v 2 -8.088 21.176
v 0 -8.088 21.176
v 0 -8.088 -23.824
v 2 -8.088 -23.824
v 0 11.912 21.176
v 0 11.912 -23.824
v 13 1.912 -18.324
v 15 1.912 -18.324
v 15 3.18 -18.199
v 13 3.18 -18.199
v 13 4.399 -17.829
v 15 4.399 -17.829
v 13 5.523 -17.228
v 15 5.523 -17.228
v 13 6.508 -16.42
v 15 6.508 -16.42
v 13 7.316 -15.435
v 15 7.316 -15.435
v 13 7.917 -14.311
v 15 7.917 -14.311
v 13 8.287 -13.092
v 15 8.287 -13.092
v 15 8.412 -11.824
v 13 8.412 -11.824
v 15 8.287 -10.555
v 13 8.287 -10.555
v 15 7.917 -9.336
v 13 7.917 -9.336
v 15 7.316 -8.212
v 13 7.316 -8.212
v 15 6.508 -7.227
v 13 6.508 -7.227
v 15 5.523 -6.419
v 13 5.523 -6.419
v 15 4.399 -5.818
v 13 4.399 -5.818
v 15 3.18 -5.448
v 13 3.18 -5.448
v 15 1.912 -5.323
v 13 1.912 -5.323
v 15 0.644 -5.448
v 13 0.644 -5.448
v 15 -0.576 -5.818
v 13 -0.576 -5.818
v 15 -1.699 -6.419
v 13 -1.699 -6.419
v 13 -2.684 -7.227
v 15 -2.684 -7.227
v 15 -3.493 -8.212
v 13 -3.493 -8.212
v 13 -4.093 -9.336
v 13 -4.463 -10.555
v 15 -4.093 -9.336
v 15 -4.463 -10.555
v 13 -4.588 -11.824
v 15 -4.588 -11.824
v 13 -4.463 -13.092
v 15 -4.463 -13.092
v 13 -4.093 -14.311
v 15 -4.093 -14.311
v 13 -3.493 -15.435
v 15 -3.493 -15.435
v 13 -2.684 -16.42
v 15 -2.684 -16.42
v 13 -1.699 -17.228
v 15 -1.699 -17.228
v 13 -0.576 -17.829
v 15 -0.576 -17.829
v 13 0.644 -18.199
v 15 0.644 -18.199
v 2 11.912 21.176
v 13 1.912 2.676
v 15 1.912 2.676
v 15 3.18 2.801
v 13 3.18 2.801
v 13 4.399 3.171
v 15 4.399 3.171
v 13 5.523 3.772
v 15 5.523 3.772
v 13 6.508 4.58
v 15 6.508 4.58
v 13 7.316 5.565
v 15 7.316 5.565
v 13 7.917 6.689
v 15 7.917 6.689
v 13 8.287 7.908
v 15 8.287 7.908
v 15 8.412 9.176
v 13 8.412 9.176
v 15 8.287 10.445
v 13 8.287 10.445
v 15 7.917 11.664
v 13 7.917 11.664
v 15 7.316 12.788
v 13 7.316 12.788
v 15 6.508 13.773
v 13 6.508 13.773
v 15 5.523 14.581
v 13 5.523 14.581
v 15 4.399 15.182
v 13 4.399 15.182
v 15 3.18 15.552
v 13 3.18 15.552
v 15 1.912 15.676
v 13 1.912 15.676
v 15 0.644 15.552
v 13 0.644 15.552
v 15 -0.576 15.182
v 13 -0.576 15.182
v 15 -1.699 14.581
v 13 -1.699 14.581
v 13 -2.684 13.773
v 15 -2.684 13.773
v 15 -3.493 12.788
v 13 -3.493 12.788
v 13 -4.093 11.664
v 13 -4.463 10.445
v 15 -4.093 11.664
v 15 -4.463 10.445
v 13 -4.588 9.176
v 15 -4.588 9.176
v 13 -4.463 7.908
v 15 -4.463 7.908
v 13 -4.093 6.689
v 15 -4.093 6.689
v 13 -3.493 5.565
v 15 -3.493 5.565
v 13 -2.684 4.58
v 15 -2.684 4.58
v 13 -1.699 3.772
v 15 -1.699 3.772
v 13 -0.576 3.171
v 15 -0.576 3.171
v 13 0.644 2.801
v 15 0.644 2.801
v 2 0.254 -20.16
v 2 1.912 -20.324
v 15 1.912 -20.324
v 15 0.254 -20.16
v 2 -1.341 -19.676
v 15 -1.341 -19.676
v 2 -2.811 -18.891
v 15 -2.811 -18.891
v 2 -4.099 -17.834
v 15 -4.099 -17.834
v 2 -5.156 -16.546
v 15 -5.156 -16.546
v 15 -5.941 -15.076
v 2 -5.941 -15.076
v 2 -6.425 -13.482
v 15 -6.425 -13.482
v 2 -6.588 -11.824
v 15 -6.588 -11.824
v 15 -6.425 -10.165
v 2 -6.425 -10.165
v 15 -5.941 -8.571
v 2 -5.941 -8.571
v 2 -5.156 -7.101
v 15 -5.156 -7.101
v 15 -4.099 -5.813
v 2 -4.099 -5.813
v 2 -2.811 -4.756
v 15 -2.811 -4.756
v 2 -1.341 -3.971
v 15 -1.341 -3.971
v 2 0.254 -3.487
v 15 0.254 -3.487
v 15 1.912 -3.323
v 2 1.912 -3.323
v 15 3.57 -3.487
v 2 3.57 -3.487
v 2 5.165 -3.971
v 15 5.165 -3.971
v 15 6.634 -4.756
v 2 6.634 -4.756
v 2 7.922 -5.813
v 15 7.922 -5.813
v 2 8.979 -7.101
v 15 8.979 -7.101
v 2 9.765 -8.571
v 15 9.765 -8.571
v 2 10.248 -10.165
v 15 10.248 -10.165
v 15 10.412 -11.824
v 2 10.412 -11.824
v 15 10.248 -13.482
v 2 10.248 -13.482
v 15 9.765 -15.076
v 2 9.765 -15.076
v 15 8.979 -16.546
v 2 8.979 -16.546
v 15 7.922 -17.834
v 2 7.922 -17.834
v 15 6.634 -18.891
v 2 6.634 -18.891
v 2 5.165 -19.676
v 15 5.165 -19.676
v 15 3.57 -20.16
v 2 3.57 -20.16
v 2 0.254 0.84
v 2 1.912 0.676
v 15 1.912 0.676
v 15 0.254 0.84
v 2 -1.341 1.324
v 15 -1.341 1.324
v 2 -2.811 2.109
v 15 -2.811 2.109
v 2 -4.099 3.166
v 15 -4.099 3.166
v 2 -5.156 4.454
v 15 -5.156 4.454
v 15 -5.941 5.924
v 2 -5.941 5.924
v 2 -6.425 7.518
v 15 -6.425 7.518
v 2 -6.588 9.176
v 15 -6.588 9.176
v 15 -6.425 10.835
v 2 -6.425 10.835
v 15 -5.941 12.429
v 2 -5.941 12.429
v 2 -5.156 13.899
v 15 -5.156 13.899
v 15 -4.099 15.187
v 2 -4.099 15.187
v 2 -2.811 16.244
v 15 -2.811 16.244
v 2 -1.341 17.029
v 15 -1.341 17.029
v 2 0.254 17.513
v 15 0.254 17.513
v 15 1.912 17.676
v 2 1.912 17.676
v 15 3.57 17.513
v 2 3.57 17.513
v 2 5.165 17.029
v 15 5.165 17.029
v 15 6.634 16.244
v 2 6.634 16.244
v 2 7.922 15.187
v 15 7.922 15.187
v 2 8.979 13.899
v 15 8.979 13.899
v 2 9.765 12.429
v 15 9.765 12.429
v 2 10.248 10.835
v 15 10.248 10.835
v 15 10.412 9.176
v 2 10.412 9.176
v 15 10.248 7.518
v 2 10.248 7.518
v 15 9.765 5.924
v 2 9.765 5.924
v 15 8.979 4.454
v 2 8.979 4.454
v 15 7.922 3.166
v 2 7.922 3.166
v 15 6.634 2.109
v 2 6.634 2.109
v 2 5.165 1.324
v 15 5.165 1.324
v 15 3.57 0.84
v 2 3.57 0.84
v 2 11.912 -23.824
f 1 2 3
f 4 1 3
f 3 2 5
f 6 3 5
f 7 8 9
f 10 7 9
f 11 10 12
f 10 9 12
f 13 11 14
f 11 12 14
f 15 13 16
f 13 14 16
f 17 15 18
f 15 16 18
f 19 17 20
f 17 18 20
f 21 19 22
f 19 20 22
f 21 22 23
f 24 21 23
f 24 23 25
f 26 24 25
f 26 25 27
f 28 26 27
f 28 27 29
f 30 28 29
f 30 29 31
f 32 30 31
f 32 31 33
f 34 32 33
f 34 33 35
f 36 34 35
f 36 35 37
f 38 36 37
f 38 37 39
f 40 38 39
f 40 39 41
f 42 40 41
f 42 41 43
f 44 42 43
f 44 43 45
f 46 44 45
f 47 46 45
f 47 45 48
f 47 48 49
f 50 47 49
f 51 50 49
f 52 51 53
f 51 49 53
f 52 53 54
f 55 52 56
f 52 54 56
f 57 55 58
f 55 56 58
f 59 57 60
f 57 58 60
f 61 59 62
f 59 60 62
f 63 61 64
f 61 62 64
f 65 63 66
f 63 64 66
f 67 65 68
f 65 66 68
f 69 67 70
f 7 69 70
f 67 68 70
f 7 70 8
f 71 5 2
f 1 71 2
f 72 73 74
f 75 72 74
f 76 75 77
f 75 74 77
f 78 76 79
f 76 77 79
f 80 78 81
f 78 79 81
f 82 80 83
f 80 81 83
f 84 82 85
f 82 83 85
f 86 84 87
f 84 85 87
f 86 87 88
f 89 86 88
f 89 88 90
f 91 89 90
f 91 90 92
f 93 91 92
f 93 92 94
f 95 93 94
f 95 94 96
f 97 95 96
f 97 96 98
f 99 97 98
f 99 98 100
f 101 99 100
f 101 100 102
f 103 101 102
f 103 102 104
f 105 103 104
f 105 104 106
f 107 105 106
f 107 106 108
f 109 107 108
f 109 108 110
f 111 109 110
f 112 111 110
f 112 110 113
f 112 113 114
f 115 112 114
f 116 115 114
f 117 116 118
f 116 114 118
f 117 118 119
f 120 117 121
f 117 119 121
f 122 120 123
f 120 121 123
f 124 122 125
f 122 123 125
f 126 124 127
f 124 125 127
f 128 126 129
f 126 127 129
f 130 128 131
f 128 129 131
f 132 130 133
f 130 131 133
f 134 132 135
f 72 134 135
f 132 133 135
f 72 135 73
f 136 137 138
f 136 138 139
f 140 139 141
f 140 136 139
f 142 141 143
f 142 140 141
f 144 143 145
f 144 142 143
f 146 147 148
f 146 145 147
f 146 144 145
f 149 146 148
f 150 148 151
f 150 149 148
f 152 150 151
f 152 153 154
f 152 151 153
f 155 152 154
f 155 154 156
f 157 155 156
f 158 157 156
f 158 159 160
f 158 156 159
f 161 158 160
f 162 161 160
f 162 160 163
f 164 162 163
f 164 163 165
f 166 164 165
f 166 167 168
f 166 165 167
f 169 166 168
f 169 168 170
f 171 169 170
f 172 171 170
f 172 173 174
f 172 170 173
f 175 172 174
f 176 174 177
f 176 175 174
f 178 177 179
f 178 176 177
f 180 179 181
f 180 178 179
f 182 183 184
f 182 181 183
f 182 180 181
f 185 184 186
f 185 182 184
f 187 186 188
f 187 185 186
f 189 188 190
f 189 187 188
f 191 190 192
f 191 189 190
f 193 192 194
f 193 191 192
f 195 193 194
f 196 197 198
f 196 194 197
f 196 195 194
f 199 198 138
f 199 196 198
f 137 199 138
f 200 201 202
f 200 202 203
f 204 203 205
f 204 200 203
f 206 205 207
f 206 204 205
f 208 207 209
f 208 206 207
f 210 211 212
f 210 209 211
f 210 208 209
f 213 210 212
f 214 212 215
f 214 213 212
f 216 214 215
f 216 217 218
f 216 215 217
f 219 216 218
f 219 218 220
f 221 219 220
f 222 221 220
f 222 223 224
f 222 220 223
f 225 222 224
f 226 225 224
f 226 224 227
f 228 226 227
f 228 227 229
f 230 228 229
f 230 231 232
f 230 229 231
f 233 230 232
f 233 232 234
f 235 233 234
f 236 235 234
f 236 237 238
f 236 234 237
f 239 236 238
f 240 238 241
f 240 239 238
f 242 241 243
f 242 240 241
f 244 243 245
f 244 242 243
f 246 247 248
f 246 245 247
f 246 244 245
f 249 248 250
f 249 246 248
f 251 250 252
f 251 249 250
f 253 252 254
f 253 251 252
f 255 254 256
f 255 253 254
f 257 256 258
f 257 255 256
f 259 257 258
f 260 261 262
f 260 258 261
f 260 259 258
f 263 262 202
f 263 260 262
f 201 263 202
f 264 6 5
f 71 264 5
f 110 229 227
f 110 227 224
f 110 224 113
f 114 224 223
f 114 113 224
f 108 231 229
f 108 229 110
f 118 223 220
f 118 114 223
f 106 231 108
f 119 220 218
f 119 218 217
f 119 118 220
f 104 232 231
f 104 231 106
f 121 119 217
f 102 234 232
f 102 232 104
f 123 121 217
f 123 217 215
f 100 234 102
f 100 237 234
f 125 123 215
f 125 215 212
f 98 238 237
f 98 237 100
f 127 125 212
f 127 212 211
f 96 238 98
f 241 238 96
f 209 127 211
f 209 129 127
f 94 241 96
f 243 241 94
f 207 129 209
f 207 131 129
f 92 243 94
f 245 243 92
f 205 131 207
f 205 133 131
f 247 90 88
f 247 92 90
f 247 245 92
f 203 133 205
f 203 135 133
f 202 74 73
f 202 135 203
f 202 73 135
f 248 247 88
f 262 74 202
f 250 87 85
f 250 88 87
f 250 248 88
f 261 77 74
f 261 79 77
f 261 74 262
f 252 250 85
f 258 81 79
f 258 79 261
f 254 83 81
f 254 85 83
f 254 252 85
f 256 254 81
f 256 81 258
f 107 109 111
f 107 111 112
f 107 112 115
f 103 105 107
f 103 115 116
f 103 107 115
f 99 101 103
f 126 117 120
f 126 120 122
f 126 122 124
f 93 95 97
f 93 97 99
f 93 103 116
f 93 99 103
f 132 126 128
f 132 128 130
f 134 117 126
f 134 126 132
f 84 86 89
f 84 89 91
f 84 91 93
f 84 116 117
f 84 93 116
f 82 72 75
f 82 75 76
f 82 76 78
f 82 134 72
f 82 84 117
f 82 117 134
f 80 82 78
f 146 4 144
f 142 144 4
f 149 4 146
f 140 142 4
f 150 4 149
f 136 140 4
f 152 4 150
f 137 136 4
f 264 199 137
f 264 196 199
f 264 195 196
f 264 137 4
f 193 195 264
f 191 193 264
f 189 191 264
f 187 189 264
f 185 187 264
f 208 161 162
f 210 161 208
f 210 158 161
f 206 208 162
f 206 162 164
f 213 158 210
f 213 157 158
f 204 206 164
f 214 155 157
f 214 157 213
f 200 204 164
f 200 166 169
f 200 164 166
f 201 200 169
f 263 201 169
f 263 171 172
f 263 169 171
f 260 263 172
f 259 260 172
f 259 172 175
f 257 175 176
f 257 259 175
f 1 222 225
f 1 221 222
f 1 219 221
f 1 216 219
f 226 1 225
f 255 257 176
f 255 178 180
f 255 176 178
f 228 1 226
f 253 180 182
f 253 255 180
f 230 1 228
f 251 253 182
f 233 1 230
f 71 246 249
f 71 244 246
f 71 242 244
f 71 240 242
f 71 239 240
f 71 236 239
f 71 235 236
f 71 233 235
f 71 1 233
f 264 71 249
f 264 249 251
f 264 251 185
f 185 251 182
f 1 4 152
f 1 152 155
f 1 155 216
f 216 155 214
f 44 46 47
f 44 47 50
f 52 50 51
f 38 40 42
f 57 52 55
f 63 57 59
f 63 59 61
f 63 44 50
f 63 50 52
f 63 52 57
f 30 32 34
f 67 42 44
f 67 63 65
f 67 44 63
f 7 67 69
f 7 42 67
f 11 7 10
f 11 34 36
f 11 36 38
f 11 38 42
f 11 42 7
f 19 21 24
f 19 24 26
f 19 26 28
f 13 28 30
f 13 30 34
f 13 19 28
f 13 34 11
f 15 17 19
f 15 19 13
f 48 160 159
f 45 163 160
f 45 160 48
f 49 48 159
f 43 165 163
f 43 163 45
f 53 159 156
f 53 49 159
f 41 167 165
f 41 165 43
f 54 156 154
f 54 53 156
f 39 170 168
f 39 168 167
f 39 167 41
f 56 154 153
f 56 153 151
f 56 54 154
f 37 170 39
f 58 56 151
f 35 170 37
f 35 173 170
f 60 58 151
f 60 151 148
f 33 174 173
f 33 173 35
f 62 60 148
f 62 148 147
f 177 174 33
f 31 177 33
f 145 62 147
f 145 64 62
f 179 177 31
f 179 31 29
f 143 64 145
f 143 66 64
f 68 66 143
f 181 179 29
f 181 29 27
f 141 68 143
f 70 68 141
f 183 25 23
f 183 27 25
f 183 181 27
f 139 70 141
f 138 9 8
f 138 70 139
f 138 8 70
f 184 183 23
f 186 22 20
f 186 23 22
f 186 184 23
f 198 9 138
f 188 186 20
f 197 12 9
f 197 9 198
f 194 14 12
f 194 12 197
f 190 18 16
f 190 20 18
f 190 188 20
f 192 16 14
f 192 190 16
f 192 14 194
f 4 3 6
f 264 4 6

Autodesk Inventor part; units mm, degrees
ref_plane "YZ Plane" through (0, 0, 0) normal (1, 0, 0) x (0, 1, 0)
ref_plane "XZ Plane" through (0, 0, 0) normal (0, 1, 0) x (-1, 0, 0)
ref_plane "XY Plane" through (0, 0, 0) normal (0, 0, 1) x (1, 0, 0)
sketch "Sketch1" plane through (0, 0, 0) normal (1, 0, 0) x (0, 1, 0)
  line L0 (11.9118, 21.1765) -> (-8.0882, 21.1765)
  line L1 (-8.0882, 21.1765) -> (-8.0882, -23.8235)
  line L2 (-8.0882, -23.8235) -> (11.9118, -23.8235)
  line L3 (11.9118, -23.8235) -> (11.9118, 21.1765)
  point P0 (0, 0)
  dimension "d0" = 45
  dimension "d1" = 20
extrude "Extrusion1" add sketch "Sketch1" along normal blind 2
sketch "Sketch2" plane through (2, 0, 0) normal (1, 0, 0) x (0, 0, -1)
  circle A0 centre (-9.1765, 1.9118) radius 8.5
  circle A1 centre (11.8235, 1.9118) radius 8.5
  line L0 (23.8235, 11.9118) -> (-21.1765, 11.9118) projected
  line L1 (-21.1765, 11.9118) -> (-21.1765, -8.0882) projected
  line L2 (23.8235, -8.0882) -> (23.8235, 11.9118) projected
  point P0 (0, 0)
  dimension "d4" = 17
  dimension "d5" = 10
  dimension "d6" = 10
  dimension "d7" = 12
  dimension "d8" = 12
extrude "Extrusion2" add sketch "Sketch2" along normal blind 13
sketch "Sketch3" plane through (15, 1.9118, 9.1765) normal (1, 0, 0) x (0, 0, -1)
  circle A0 centre (0, 0) radius 6.5
  circle A1 centre (21, 0) radius 6.5
  circle A2 centre (21, 0) radius 8.5 projected
  circle A3 centre (0, 0) radius 8.5 projected
  point P0 (9.1765, -1.9118)
  dimension "d11" = 13
extrude "Extrusion3" cut sketch "Sketch3" against normal blind 2 contours A0 | A1
equation "\"d6\" = d5"
equation "\"d8\" = d7"
properties part number "Sonar"
